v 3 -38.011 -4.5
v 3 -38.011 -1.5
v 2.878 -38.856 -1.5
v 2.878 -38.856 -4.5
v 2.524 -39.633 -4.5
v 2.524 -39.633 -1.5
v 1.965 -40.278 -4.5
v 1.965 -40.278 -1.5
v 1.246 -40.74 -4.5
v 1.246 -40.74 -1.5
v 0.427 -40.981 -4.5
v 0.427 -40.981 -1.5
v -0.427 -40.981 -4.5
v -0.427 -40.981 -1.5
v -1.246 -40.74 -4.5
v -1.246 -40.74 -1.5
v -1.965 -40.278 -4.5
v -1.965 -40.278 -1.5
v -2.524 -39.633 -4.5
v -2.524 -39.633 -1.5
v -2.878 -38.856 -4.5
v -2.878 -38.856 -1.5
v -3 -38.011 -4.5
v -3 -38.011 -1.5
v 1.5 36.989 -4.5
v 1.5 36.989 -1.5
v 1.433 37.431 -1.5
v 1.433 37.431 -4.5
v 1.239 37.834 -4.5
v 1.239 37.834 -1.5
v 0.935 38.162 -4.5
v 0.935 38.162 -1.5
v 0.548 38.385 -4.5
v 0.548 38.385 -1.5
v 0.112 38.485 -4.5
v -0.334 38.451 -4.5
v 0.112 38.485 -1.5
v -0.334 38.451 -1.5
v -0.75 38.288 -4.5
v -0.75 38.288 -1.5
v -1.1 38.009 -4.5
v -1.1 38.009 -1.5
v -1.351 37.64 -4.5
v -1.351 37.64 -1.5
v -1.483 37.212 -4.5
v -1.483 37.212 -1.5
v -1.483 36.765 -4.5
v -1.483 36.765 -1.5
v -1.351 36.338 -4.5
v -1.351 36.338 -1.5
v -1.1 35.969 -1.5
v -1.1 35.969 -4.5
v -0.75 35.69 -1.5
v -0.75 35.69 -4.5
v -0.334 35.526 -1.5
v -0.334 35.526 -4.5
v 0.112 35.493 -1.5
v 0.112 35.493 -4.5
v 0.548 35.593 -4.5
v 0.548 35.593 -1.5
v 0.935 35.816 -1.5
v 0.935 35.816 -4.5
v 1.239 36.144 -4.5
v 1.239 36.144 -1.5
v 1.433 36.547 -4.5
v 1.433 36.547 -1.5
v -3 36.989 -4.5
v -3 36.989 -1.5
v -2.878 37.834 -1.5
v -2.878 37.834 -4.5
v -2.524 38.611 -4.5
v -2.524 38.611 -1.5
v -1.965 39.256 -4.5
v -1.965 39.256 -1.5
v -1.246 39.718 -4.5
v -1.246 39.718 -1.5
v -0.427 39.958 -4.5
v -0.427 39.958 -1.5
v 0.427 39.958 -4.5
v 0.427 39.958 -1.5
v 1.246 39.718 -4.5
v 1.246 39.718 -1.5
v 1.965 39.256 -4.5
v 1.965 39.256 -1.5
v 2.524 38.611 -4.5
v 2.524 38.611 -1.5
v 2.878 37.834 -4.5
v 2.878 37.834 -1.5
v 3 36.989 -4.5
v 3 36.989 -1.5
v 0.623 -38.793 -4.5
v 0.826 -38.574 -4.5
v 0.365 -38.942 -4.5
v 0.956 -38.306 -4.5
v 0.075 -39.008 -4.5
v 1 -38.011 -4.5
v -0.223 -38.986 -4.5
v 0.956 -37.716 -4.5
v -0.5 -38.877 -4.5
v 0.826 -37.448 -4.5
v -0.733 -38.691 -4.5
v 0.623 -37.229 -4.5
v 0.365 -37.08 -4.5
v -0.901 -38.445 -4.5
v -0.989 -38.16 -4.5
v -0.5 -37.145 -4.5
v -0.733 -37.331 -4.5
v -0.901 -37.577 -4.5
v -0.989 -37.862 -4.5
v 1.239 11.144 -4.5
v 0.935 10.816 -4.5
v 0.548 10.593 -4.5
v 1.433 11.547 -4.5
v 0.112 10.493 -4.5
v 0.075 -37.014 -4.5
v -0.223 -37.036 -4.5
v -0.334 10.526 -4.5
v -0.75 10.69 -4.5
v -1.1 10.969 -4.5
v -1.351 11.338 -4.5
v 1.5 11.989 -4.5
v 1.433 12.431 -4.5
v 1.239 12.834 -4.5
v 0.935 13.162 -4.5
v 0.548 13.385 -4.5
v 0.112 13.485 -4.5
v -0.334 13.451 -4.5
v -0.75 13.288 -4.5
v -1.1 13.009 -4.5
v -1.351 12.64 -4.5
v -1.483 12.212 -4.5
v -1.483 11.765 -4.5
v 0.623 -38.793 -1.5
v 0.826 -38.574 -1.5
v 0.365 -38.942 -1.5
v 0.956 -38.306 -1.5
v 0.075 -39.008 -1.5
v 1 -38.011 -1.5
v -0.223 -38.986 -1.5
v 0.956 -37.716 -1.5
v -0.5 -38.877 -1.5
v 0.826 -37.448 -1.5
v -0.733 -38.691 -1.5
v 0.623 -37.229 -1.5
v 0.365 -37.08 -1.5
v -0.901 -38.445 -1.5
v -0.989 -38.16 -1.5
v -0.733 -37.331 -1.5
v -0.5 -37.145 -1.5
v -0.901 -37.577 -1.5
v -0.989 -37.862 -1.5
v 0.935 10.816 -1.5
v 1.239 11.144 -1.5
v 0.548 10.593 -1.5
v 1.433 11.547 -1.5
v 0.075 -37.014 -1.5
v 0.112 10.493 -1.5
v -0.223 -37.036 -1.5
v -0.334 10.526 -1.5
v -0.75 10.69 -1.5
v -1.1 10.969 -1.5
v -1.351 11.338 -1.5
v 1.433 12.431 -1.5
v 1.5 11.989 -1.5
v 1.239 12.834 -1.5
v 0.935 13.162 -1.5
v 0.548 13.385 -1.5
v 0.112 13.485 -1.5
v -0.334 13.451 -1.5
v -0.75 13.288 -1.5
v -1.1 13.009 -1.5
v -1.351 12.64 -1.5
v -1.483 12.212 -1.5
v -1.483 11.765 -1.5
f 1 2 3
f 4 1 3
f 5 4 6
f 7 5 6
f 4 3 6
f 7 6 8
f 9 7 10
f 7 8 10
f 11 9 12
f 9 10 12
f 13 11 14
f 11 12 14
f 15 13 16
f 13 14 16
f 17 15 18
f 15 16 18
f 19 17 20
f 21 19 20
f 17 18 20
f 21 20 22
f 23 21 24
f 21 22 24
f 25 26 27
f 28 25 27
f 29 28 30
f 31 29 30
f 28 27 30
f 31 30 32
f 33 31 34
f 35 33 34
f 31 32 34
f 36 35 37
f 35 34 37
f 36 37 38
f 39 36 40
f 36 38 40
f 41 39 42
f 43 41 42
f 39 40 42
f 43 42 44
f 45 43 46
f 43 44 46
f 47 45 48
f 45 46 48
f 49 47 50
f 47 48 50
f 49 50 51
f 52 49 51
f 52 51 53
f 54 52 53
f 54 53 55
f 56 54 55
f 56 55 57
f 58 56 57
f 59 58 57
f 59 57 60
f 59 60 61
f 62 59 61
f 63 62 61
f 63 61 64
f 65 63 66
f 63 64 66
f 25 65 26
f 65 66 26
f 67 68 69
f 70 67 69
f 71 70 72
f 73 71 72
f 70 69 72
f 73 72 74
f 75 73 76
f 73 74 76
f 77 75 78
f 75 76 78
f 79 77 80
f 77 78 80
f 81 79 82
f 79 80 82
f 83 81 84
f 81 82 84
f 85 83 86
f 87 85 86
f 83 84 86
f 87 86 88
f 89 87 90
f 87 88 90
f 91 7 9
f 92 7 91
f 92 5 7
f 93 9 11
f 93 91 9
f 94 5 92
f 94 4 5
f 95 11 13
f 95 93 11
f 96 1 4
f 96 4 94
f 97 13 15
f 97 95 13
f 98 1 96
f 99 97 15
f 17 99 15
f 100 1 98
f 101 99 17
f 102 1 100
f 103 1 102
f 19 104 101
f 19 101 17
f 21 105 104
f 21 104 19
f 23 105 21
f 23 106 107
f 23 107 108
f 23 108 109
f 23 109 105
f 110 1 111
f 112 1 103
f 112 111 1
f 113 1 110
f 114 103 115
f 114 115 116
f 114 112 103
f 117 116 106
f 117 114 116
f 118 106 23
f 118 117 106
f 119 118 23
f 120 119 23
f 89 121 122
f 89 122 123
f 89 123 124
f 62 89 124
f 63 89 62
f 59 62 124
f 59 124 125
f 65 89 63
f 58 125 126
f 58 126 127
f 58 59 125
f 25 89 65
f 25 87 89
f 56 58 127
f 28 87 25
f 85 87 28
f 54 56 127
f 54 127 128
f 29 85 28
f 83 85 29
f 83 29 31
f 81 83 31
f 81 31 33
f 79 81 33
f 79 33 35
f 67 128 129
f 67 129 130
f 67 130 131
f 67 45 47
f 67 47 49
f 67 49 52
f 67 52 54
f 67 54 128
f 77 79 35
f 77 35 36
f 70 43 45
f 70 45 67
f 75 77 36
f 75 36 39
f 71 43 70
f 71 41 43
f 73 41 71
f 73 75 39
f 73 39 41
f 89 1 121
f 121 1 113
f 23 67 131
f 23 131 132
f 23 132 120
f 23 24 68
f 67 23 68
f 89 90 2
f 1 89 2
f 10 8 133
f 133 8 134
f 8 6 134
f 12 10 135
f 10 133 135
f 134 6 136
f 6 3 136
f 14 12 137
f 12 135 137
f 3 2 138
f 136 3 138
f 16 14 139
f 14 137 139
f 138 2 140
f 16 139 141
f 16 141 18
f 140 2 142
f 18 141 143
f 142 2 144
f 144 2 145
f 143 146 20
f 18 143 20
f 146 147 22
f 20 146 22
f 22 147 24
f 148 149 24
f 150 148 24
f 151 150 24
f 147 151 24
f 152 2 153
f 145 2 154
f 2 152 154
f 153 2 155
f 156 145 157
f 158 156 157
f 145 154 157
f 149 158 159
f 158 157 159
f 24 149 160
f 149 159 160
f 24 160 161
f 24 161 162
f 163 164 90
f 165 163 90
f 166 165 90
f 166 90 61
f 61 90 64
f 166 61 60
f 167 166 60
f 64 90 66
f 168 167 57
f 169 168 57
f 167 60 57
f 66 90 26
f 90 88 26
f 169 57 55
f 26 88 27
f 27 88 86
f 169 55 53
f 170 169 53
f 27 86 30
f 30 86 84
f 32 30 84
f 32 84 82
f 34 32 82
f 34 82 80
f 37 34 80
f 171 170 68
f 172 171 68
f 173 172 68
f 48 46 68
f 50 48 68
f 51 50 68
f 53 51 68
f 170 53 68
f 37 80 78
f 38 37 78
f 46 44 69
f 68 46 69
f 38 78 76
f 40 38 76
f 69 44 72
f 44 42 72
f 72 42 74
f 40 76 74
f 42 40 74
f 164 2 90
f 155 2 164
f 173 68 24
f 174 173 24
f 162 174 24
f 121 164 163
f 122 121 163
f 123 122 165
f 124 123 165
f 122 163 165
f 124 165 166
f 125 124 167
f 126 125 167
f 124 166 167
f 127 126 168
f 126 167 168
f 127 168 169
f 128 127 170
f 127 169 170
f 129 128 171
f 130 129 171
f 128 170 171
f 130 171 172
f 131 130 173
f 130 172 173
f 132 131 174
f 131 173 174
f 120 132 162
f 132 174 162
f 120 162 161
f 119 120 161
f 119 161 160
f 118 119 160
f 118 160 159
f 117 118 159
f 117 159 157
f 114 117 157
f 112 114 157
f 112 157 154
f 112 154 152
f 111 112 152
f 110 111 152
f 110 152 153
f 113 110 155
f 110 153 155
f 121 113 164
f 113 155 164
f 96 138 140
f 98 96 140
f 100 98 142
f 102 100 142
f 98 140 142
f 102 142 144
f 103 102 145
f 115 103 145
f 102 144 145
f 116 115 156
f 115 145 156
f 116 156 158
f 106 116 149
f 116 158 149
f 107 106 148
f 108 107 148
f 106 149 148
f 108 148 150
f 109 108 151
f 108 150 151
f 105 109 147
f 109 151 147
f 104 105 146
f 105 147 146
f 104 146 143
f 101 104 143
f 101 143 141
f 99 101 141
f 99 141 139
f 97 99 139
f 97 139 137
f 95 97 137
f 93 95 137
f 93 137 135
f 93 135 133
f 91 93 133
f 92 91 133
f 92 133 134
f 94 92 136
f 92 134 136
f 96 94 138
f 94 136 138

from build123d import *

# Parameters (mm, degrees)
SKETCH2_R           = 3
SKETCH2_R_2         = 2
BOSS_EXTRUDE1_DEPTH = 6
SCALE1_SCALE        = 0.5


with BuildPart() as part:
    # Sketch2 → Boss-Extrude1 (new body)
    with BuildSketch(Plane.XY):
        with BuildLine():
            Line((6, 75), (6, -75))
            ThreePointArc((6, -75), (0, -81), (-6, -75))
            Line((-6, -75), (-6, 75))
            ThreePointArc((-6, 75), (0, 81), (6, 75))
        make_face()
        with Locations((0, 75)):
            Circle(SKETCH2_R, mode=Mode.SUBTRACT)
        with Locations((0, 25)):
            Circle(SKETCH2_R, mode=Mode.SUBTRACT)
        with Locations((0, -75)):
            Circle(SKETCH2_R_2, mode=Mode.SUBTRACT)
    extrude(amount=-BOSS_EXTRUDE1_DEPTH)


with BuildPart() as part_1:
    # Scale1: scaled about (0, -1.022220005, -3)
    add(part.part.scale(SCALE1_SCALE).moved(Location((0, -0.511110003, -1.5))))


solid = part_1.part
